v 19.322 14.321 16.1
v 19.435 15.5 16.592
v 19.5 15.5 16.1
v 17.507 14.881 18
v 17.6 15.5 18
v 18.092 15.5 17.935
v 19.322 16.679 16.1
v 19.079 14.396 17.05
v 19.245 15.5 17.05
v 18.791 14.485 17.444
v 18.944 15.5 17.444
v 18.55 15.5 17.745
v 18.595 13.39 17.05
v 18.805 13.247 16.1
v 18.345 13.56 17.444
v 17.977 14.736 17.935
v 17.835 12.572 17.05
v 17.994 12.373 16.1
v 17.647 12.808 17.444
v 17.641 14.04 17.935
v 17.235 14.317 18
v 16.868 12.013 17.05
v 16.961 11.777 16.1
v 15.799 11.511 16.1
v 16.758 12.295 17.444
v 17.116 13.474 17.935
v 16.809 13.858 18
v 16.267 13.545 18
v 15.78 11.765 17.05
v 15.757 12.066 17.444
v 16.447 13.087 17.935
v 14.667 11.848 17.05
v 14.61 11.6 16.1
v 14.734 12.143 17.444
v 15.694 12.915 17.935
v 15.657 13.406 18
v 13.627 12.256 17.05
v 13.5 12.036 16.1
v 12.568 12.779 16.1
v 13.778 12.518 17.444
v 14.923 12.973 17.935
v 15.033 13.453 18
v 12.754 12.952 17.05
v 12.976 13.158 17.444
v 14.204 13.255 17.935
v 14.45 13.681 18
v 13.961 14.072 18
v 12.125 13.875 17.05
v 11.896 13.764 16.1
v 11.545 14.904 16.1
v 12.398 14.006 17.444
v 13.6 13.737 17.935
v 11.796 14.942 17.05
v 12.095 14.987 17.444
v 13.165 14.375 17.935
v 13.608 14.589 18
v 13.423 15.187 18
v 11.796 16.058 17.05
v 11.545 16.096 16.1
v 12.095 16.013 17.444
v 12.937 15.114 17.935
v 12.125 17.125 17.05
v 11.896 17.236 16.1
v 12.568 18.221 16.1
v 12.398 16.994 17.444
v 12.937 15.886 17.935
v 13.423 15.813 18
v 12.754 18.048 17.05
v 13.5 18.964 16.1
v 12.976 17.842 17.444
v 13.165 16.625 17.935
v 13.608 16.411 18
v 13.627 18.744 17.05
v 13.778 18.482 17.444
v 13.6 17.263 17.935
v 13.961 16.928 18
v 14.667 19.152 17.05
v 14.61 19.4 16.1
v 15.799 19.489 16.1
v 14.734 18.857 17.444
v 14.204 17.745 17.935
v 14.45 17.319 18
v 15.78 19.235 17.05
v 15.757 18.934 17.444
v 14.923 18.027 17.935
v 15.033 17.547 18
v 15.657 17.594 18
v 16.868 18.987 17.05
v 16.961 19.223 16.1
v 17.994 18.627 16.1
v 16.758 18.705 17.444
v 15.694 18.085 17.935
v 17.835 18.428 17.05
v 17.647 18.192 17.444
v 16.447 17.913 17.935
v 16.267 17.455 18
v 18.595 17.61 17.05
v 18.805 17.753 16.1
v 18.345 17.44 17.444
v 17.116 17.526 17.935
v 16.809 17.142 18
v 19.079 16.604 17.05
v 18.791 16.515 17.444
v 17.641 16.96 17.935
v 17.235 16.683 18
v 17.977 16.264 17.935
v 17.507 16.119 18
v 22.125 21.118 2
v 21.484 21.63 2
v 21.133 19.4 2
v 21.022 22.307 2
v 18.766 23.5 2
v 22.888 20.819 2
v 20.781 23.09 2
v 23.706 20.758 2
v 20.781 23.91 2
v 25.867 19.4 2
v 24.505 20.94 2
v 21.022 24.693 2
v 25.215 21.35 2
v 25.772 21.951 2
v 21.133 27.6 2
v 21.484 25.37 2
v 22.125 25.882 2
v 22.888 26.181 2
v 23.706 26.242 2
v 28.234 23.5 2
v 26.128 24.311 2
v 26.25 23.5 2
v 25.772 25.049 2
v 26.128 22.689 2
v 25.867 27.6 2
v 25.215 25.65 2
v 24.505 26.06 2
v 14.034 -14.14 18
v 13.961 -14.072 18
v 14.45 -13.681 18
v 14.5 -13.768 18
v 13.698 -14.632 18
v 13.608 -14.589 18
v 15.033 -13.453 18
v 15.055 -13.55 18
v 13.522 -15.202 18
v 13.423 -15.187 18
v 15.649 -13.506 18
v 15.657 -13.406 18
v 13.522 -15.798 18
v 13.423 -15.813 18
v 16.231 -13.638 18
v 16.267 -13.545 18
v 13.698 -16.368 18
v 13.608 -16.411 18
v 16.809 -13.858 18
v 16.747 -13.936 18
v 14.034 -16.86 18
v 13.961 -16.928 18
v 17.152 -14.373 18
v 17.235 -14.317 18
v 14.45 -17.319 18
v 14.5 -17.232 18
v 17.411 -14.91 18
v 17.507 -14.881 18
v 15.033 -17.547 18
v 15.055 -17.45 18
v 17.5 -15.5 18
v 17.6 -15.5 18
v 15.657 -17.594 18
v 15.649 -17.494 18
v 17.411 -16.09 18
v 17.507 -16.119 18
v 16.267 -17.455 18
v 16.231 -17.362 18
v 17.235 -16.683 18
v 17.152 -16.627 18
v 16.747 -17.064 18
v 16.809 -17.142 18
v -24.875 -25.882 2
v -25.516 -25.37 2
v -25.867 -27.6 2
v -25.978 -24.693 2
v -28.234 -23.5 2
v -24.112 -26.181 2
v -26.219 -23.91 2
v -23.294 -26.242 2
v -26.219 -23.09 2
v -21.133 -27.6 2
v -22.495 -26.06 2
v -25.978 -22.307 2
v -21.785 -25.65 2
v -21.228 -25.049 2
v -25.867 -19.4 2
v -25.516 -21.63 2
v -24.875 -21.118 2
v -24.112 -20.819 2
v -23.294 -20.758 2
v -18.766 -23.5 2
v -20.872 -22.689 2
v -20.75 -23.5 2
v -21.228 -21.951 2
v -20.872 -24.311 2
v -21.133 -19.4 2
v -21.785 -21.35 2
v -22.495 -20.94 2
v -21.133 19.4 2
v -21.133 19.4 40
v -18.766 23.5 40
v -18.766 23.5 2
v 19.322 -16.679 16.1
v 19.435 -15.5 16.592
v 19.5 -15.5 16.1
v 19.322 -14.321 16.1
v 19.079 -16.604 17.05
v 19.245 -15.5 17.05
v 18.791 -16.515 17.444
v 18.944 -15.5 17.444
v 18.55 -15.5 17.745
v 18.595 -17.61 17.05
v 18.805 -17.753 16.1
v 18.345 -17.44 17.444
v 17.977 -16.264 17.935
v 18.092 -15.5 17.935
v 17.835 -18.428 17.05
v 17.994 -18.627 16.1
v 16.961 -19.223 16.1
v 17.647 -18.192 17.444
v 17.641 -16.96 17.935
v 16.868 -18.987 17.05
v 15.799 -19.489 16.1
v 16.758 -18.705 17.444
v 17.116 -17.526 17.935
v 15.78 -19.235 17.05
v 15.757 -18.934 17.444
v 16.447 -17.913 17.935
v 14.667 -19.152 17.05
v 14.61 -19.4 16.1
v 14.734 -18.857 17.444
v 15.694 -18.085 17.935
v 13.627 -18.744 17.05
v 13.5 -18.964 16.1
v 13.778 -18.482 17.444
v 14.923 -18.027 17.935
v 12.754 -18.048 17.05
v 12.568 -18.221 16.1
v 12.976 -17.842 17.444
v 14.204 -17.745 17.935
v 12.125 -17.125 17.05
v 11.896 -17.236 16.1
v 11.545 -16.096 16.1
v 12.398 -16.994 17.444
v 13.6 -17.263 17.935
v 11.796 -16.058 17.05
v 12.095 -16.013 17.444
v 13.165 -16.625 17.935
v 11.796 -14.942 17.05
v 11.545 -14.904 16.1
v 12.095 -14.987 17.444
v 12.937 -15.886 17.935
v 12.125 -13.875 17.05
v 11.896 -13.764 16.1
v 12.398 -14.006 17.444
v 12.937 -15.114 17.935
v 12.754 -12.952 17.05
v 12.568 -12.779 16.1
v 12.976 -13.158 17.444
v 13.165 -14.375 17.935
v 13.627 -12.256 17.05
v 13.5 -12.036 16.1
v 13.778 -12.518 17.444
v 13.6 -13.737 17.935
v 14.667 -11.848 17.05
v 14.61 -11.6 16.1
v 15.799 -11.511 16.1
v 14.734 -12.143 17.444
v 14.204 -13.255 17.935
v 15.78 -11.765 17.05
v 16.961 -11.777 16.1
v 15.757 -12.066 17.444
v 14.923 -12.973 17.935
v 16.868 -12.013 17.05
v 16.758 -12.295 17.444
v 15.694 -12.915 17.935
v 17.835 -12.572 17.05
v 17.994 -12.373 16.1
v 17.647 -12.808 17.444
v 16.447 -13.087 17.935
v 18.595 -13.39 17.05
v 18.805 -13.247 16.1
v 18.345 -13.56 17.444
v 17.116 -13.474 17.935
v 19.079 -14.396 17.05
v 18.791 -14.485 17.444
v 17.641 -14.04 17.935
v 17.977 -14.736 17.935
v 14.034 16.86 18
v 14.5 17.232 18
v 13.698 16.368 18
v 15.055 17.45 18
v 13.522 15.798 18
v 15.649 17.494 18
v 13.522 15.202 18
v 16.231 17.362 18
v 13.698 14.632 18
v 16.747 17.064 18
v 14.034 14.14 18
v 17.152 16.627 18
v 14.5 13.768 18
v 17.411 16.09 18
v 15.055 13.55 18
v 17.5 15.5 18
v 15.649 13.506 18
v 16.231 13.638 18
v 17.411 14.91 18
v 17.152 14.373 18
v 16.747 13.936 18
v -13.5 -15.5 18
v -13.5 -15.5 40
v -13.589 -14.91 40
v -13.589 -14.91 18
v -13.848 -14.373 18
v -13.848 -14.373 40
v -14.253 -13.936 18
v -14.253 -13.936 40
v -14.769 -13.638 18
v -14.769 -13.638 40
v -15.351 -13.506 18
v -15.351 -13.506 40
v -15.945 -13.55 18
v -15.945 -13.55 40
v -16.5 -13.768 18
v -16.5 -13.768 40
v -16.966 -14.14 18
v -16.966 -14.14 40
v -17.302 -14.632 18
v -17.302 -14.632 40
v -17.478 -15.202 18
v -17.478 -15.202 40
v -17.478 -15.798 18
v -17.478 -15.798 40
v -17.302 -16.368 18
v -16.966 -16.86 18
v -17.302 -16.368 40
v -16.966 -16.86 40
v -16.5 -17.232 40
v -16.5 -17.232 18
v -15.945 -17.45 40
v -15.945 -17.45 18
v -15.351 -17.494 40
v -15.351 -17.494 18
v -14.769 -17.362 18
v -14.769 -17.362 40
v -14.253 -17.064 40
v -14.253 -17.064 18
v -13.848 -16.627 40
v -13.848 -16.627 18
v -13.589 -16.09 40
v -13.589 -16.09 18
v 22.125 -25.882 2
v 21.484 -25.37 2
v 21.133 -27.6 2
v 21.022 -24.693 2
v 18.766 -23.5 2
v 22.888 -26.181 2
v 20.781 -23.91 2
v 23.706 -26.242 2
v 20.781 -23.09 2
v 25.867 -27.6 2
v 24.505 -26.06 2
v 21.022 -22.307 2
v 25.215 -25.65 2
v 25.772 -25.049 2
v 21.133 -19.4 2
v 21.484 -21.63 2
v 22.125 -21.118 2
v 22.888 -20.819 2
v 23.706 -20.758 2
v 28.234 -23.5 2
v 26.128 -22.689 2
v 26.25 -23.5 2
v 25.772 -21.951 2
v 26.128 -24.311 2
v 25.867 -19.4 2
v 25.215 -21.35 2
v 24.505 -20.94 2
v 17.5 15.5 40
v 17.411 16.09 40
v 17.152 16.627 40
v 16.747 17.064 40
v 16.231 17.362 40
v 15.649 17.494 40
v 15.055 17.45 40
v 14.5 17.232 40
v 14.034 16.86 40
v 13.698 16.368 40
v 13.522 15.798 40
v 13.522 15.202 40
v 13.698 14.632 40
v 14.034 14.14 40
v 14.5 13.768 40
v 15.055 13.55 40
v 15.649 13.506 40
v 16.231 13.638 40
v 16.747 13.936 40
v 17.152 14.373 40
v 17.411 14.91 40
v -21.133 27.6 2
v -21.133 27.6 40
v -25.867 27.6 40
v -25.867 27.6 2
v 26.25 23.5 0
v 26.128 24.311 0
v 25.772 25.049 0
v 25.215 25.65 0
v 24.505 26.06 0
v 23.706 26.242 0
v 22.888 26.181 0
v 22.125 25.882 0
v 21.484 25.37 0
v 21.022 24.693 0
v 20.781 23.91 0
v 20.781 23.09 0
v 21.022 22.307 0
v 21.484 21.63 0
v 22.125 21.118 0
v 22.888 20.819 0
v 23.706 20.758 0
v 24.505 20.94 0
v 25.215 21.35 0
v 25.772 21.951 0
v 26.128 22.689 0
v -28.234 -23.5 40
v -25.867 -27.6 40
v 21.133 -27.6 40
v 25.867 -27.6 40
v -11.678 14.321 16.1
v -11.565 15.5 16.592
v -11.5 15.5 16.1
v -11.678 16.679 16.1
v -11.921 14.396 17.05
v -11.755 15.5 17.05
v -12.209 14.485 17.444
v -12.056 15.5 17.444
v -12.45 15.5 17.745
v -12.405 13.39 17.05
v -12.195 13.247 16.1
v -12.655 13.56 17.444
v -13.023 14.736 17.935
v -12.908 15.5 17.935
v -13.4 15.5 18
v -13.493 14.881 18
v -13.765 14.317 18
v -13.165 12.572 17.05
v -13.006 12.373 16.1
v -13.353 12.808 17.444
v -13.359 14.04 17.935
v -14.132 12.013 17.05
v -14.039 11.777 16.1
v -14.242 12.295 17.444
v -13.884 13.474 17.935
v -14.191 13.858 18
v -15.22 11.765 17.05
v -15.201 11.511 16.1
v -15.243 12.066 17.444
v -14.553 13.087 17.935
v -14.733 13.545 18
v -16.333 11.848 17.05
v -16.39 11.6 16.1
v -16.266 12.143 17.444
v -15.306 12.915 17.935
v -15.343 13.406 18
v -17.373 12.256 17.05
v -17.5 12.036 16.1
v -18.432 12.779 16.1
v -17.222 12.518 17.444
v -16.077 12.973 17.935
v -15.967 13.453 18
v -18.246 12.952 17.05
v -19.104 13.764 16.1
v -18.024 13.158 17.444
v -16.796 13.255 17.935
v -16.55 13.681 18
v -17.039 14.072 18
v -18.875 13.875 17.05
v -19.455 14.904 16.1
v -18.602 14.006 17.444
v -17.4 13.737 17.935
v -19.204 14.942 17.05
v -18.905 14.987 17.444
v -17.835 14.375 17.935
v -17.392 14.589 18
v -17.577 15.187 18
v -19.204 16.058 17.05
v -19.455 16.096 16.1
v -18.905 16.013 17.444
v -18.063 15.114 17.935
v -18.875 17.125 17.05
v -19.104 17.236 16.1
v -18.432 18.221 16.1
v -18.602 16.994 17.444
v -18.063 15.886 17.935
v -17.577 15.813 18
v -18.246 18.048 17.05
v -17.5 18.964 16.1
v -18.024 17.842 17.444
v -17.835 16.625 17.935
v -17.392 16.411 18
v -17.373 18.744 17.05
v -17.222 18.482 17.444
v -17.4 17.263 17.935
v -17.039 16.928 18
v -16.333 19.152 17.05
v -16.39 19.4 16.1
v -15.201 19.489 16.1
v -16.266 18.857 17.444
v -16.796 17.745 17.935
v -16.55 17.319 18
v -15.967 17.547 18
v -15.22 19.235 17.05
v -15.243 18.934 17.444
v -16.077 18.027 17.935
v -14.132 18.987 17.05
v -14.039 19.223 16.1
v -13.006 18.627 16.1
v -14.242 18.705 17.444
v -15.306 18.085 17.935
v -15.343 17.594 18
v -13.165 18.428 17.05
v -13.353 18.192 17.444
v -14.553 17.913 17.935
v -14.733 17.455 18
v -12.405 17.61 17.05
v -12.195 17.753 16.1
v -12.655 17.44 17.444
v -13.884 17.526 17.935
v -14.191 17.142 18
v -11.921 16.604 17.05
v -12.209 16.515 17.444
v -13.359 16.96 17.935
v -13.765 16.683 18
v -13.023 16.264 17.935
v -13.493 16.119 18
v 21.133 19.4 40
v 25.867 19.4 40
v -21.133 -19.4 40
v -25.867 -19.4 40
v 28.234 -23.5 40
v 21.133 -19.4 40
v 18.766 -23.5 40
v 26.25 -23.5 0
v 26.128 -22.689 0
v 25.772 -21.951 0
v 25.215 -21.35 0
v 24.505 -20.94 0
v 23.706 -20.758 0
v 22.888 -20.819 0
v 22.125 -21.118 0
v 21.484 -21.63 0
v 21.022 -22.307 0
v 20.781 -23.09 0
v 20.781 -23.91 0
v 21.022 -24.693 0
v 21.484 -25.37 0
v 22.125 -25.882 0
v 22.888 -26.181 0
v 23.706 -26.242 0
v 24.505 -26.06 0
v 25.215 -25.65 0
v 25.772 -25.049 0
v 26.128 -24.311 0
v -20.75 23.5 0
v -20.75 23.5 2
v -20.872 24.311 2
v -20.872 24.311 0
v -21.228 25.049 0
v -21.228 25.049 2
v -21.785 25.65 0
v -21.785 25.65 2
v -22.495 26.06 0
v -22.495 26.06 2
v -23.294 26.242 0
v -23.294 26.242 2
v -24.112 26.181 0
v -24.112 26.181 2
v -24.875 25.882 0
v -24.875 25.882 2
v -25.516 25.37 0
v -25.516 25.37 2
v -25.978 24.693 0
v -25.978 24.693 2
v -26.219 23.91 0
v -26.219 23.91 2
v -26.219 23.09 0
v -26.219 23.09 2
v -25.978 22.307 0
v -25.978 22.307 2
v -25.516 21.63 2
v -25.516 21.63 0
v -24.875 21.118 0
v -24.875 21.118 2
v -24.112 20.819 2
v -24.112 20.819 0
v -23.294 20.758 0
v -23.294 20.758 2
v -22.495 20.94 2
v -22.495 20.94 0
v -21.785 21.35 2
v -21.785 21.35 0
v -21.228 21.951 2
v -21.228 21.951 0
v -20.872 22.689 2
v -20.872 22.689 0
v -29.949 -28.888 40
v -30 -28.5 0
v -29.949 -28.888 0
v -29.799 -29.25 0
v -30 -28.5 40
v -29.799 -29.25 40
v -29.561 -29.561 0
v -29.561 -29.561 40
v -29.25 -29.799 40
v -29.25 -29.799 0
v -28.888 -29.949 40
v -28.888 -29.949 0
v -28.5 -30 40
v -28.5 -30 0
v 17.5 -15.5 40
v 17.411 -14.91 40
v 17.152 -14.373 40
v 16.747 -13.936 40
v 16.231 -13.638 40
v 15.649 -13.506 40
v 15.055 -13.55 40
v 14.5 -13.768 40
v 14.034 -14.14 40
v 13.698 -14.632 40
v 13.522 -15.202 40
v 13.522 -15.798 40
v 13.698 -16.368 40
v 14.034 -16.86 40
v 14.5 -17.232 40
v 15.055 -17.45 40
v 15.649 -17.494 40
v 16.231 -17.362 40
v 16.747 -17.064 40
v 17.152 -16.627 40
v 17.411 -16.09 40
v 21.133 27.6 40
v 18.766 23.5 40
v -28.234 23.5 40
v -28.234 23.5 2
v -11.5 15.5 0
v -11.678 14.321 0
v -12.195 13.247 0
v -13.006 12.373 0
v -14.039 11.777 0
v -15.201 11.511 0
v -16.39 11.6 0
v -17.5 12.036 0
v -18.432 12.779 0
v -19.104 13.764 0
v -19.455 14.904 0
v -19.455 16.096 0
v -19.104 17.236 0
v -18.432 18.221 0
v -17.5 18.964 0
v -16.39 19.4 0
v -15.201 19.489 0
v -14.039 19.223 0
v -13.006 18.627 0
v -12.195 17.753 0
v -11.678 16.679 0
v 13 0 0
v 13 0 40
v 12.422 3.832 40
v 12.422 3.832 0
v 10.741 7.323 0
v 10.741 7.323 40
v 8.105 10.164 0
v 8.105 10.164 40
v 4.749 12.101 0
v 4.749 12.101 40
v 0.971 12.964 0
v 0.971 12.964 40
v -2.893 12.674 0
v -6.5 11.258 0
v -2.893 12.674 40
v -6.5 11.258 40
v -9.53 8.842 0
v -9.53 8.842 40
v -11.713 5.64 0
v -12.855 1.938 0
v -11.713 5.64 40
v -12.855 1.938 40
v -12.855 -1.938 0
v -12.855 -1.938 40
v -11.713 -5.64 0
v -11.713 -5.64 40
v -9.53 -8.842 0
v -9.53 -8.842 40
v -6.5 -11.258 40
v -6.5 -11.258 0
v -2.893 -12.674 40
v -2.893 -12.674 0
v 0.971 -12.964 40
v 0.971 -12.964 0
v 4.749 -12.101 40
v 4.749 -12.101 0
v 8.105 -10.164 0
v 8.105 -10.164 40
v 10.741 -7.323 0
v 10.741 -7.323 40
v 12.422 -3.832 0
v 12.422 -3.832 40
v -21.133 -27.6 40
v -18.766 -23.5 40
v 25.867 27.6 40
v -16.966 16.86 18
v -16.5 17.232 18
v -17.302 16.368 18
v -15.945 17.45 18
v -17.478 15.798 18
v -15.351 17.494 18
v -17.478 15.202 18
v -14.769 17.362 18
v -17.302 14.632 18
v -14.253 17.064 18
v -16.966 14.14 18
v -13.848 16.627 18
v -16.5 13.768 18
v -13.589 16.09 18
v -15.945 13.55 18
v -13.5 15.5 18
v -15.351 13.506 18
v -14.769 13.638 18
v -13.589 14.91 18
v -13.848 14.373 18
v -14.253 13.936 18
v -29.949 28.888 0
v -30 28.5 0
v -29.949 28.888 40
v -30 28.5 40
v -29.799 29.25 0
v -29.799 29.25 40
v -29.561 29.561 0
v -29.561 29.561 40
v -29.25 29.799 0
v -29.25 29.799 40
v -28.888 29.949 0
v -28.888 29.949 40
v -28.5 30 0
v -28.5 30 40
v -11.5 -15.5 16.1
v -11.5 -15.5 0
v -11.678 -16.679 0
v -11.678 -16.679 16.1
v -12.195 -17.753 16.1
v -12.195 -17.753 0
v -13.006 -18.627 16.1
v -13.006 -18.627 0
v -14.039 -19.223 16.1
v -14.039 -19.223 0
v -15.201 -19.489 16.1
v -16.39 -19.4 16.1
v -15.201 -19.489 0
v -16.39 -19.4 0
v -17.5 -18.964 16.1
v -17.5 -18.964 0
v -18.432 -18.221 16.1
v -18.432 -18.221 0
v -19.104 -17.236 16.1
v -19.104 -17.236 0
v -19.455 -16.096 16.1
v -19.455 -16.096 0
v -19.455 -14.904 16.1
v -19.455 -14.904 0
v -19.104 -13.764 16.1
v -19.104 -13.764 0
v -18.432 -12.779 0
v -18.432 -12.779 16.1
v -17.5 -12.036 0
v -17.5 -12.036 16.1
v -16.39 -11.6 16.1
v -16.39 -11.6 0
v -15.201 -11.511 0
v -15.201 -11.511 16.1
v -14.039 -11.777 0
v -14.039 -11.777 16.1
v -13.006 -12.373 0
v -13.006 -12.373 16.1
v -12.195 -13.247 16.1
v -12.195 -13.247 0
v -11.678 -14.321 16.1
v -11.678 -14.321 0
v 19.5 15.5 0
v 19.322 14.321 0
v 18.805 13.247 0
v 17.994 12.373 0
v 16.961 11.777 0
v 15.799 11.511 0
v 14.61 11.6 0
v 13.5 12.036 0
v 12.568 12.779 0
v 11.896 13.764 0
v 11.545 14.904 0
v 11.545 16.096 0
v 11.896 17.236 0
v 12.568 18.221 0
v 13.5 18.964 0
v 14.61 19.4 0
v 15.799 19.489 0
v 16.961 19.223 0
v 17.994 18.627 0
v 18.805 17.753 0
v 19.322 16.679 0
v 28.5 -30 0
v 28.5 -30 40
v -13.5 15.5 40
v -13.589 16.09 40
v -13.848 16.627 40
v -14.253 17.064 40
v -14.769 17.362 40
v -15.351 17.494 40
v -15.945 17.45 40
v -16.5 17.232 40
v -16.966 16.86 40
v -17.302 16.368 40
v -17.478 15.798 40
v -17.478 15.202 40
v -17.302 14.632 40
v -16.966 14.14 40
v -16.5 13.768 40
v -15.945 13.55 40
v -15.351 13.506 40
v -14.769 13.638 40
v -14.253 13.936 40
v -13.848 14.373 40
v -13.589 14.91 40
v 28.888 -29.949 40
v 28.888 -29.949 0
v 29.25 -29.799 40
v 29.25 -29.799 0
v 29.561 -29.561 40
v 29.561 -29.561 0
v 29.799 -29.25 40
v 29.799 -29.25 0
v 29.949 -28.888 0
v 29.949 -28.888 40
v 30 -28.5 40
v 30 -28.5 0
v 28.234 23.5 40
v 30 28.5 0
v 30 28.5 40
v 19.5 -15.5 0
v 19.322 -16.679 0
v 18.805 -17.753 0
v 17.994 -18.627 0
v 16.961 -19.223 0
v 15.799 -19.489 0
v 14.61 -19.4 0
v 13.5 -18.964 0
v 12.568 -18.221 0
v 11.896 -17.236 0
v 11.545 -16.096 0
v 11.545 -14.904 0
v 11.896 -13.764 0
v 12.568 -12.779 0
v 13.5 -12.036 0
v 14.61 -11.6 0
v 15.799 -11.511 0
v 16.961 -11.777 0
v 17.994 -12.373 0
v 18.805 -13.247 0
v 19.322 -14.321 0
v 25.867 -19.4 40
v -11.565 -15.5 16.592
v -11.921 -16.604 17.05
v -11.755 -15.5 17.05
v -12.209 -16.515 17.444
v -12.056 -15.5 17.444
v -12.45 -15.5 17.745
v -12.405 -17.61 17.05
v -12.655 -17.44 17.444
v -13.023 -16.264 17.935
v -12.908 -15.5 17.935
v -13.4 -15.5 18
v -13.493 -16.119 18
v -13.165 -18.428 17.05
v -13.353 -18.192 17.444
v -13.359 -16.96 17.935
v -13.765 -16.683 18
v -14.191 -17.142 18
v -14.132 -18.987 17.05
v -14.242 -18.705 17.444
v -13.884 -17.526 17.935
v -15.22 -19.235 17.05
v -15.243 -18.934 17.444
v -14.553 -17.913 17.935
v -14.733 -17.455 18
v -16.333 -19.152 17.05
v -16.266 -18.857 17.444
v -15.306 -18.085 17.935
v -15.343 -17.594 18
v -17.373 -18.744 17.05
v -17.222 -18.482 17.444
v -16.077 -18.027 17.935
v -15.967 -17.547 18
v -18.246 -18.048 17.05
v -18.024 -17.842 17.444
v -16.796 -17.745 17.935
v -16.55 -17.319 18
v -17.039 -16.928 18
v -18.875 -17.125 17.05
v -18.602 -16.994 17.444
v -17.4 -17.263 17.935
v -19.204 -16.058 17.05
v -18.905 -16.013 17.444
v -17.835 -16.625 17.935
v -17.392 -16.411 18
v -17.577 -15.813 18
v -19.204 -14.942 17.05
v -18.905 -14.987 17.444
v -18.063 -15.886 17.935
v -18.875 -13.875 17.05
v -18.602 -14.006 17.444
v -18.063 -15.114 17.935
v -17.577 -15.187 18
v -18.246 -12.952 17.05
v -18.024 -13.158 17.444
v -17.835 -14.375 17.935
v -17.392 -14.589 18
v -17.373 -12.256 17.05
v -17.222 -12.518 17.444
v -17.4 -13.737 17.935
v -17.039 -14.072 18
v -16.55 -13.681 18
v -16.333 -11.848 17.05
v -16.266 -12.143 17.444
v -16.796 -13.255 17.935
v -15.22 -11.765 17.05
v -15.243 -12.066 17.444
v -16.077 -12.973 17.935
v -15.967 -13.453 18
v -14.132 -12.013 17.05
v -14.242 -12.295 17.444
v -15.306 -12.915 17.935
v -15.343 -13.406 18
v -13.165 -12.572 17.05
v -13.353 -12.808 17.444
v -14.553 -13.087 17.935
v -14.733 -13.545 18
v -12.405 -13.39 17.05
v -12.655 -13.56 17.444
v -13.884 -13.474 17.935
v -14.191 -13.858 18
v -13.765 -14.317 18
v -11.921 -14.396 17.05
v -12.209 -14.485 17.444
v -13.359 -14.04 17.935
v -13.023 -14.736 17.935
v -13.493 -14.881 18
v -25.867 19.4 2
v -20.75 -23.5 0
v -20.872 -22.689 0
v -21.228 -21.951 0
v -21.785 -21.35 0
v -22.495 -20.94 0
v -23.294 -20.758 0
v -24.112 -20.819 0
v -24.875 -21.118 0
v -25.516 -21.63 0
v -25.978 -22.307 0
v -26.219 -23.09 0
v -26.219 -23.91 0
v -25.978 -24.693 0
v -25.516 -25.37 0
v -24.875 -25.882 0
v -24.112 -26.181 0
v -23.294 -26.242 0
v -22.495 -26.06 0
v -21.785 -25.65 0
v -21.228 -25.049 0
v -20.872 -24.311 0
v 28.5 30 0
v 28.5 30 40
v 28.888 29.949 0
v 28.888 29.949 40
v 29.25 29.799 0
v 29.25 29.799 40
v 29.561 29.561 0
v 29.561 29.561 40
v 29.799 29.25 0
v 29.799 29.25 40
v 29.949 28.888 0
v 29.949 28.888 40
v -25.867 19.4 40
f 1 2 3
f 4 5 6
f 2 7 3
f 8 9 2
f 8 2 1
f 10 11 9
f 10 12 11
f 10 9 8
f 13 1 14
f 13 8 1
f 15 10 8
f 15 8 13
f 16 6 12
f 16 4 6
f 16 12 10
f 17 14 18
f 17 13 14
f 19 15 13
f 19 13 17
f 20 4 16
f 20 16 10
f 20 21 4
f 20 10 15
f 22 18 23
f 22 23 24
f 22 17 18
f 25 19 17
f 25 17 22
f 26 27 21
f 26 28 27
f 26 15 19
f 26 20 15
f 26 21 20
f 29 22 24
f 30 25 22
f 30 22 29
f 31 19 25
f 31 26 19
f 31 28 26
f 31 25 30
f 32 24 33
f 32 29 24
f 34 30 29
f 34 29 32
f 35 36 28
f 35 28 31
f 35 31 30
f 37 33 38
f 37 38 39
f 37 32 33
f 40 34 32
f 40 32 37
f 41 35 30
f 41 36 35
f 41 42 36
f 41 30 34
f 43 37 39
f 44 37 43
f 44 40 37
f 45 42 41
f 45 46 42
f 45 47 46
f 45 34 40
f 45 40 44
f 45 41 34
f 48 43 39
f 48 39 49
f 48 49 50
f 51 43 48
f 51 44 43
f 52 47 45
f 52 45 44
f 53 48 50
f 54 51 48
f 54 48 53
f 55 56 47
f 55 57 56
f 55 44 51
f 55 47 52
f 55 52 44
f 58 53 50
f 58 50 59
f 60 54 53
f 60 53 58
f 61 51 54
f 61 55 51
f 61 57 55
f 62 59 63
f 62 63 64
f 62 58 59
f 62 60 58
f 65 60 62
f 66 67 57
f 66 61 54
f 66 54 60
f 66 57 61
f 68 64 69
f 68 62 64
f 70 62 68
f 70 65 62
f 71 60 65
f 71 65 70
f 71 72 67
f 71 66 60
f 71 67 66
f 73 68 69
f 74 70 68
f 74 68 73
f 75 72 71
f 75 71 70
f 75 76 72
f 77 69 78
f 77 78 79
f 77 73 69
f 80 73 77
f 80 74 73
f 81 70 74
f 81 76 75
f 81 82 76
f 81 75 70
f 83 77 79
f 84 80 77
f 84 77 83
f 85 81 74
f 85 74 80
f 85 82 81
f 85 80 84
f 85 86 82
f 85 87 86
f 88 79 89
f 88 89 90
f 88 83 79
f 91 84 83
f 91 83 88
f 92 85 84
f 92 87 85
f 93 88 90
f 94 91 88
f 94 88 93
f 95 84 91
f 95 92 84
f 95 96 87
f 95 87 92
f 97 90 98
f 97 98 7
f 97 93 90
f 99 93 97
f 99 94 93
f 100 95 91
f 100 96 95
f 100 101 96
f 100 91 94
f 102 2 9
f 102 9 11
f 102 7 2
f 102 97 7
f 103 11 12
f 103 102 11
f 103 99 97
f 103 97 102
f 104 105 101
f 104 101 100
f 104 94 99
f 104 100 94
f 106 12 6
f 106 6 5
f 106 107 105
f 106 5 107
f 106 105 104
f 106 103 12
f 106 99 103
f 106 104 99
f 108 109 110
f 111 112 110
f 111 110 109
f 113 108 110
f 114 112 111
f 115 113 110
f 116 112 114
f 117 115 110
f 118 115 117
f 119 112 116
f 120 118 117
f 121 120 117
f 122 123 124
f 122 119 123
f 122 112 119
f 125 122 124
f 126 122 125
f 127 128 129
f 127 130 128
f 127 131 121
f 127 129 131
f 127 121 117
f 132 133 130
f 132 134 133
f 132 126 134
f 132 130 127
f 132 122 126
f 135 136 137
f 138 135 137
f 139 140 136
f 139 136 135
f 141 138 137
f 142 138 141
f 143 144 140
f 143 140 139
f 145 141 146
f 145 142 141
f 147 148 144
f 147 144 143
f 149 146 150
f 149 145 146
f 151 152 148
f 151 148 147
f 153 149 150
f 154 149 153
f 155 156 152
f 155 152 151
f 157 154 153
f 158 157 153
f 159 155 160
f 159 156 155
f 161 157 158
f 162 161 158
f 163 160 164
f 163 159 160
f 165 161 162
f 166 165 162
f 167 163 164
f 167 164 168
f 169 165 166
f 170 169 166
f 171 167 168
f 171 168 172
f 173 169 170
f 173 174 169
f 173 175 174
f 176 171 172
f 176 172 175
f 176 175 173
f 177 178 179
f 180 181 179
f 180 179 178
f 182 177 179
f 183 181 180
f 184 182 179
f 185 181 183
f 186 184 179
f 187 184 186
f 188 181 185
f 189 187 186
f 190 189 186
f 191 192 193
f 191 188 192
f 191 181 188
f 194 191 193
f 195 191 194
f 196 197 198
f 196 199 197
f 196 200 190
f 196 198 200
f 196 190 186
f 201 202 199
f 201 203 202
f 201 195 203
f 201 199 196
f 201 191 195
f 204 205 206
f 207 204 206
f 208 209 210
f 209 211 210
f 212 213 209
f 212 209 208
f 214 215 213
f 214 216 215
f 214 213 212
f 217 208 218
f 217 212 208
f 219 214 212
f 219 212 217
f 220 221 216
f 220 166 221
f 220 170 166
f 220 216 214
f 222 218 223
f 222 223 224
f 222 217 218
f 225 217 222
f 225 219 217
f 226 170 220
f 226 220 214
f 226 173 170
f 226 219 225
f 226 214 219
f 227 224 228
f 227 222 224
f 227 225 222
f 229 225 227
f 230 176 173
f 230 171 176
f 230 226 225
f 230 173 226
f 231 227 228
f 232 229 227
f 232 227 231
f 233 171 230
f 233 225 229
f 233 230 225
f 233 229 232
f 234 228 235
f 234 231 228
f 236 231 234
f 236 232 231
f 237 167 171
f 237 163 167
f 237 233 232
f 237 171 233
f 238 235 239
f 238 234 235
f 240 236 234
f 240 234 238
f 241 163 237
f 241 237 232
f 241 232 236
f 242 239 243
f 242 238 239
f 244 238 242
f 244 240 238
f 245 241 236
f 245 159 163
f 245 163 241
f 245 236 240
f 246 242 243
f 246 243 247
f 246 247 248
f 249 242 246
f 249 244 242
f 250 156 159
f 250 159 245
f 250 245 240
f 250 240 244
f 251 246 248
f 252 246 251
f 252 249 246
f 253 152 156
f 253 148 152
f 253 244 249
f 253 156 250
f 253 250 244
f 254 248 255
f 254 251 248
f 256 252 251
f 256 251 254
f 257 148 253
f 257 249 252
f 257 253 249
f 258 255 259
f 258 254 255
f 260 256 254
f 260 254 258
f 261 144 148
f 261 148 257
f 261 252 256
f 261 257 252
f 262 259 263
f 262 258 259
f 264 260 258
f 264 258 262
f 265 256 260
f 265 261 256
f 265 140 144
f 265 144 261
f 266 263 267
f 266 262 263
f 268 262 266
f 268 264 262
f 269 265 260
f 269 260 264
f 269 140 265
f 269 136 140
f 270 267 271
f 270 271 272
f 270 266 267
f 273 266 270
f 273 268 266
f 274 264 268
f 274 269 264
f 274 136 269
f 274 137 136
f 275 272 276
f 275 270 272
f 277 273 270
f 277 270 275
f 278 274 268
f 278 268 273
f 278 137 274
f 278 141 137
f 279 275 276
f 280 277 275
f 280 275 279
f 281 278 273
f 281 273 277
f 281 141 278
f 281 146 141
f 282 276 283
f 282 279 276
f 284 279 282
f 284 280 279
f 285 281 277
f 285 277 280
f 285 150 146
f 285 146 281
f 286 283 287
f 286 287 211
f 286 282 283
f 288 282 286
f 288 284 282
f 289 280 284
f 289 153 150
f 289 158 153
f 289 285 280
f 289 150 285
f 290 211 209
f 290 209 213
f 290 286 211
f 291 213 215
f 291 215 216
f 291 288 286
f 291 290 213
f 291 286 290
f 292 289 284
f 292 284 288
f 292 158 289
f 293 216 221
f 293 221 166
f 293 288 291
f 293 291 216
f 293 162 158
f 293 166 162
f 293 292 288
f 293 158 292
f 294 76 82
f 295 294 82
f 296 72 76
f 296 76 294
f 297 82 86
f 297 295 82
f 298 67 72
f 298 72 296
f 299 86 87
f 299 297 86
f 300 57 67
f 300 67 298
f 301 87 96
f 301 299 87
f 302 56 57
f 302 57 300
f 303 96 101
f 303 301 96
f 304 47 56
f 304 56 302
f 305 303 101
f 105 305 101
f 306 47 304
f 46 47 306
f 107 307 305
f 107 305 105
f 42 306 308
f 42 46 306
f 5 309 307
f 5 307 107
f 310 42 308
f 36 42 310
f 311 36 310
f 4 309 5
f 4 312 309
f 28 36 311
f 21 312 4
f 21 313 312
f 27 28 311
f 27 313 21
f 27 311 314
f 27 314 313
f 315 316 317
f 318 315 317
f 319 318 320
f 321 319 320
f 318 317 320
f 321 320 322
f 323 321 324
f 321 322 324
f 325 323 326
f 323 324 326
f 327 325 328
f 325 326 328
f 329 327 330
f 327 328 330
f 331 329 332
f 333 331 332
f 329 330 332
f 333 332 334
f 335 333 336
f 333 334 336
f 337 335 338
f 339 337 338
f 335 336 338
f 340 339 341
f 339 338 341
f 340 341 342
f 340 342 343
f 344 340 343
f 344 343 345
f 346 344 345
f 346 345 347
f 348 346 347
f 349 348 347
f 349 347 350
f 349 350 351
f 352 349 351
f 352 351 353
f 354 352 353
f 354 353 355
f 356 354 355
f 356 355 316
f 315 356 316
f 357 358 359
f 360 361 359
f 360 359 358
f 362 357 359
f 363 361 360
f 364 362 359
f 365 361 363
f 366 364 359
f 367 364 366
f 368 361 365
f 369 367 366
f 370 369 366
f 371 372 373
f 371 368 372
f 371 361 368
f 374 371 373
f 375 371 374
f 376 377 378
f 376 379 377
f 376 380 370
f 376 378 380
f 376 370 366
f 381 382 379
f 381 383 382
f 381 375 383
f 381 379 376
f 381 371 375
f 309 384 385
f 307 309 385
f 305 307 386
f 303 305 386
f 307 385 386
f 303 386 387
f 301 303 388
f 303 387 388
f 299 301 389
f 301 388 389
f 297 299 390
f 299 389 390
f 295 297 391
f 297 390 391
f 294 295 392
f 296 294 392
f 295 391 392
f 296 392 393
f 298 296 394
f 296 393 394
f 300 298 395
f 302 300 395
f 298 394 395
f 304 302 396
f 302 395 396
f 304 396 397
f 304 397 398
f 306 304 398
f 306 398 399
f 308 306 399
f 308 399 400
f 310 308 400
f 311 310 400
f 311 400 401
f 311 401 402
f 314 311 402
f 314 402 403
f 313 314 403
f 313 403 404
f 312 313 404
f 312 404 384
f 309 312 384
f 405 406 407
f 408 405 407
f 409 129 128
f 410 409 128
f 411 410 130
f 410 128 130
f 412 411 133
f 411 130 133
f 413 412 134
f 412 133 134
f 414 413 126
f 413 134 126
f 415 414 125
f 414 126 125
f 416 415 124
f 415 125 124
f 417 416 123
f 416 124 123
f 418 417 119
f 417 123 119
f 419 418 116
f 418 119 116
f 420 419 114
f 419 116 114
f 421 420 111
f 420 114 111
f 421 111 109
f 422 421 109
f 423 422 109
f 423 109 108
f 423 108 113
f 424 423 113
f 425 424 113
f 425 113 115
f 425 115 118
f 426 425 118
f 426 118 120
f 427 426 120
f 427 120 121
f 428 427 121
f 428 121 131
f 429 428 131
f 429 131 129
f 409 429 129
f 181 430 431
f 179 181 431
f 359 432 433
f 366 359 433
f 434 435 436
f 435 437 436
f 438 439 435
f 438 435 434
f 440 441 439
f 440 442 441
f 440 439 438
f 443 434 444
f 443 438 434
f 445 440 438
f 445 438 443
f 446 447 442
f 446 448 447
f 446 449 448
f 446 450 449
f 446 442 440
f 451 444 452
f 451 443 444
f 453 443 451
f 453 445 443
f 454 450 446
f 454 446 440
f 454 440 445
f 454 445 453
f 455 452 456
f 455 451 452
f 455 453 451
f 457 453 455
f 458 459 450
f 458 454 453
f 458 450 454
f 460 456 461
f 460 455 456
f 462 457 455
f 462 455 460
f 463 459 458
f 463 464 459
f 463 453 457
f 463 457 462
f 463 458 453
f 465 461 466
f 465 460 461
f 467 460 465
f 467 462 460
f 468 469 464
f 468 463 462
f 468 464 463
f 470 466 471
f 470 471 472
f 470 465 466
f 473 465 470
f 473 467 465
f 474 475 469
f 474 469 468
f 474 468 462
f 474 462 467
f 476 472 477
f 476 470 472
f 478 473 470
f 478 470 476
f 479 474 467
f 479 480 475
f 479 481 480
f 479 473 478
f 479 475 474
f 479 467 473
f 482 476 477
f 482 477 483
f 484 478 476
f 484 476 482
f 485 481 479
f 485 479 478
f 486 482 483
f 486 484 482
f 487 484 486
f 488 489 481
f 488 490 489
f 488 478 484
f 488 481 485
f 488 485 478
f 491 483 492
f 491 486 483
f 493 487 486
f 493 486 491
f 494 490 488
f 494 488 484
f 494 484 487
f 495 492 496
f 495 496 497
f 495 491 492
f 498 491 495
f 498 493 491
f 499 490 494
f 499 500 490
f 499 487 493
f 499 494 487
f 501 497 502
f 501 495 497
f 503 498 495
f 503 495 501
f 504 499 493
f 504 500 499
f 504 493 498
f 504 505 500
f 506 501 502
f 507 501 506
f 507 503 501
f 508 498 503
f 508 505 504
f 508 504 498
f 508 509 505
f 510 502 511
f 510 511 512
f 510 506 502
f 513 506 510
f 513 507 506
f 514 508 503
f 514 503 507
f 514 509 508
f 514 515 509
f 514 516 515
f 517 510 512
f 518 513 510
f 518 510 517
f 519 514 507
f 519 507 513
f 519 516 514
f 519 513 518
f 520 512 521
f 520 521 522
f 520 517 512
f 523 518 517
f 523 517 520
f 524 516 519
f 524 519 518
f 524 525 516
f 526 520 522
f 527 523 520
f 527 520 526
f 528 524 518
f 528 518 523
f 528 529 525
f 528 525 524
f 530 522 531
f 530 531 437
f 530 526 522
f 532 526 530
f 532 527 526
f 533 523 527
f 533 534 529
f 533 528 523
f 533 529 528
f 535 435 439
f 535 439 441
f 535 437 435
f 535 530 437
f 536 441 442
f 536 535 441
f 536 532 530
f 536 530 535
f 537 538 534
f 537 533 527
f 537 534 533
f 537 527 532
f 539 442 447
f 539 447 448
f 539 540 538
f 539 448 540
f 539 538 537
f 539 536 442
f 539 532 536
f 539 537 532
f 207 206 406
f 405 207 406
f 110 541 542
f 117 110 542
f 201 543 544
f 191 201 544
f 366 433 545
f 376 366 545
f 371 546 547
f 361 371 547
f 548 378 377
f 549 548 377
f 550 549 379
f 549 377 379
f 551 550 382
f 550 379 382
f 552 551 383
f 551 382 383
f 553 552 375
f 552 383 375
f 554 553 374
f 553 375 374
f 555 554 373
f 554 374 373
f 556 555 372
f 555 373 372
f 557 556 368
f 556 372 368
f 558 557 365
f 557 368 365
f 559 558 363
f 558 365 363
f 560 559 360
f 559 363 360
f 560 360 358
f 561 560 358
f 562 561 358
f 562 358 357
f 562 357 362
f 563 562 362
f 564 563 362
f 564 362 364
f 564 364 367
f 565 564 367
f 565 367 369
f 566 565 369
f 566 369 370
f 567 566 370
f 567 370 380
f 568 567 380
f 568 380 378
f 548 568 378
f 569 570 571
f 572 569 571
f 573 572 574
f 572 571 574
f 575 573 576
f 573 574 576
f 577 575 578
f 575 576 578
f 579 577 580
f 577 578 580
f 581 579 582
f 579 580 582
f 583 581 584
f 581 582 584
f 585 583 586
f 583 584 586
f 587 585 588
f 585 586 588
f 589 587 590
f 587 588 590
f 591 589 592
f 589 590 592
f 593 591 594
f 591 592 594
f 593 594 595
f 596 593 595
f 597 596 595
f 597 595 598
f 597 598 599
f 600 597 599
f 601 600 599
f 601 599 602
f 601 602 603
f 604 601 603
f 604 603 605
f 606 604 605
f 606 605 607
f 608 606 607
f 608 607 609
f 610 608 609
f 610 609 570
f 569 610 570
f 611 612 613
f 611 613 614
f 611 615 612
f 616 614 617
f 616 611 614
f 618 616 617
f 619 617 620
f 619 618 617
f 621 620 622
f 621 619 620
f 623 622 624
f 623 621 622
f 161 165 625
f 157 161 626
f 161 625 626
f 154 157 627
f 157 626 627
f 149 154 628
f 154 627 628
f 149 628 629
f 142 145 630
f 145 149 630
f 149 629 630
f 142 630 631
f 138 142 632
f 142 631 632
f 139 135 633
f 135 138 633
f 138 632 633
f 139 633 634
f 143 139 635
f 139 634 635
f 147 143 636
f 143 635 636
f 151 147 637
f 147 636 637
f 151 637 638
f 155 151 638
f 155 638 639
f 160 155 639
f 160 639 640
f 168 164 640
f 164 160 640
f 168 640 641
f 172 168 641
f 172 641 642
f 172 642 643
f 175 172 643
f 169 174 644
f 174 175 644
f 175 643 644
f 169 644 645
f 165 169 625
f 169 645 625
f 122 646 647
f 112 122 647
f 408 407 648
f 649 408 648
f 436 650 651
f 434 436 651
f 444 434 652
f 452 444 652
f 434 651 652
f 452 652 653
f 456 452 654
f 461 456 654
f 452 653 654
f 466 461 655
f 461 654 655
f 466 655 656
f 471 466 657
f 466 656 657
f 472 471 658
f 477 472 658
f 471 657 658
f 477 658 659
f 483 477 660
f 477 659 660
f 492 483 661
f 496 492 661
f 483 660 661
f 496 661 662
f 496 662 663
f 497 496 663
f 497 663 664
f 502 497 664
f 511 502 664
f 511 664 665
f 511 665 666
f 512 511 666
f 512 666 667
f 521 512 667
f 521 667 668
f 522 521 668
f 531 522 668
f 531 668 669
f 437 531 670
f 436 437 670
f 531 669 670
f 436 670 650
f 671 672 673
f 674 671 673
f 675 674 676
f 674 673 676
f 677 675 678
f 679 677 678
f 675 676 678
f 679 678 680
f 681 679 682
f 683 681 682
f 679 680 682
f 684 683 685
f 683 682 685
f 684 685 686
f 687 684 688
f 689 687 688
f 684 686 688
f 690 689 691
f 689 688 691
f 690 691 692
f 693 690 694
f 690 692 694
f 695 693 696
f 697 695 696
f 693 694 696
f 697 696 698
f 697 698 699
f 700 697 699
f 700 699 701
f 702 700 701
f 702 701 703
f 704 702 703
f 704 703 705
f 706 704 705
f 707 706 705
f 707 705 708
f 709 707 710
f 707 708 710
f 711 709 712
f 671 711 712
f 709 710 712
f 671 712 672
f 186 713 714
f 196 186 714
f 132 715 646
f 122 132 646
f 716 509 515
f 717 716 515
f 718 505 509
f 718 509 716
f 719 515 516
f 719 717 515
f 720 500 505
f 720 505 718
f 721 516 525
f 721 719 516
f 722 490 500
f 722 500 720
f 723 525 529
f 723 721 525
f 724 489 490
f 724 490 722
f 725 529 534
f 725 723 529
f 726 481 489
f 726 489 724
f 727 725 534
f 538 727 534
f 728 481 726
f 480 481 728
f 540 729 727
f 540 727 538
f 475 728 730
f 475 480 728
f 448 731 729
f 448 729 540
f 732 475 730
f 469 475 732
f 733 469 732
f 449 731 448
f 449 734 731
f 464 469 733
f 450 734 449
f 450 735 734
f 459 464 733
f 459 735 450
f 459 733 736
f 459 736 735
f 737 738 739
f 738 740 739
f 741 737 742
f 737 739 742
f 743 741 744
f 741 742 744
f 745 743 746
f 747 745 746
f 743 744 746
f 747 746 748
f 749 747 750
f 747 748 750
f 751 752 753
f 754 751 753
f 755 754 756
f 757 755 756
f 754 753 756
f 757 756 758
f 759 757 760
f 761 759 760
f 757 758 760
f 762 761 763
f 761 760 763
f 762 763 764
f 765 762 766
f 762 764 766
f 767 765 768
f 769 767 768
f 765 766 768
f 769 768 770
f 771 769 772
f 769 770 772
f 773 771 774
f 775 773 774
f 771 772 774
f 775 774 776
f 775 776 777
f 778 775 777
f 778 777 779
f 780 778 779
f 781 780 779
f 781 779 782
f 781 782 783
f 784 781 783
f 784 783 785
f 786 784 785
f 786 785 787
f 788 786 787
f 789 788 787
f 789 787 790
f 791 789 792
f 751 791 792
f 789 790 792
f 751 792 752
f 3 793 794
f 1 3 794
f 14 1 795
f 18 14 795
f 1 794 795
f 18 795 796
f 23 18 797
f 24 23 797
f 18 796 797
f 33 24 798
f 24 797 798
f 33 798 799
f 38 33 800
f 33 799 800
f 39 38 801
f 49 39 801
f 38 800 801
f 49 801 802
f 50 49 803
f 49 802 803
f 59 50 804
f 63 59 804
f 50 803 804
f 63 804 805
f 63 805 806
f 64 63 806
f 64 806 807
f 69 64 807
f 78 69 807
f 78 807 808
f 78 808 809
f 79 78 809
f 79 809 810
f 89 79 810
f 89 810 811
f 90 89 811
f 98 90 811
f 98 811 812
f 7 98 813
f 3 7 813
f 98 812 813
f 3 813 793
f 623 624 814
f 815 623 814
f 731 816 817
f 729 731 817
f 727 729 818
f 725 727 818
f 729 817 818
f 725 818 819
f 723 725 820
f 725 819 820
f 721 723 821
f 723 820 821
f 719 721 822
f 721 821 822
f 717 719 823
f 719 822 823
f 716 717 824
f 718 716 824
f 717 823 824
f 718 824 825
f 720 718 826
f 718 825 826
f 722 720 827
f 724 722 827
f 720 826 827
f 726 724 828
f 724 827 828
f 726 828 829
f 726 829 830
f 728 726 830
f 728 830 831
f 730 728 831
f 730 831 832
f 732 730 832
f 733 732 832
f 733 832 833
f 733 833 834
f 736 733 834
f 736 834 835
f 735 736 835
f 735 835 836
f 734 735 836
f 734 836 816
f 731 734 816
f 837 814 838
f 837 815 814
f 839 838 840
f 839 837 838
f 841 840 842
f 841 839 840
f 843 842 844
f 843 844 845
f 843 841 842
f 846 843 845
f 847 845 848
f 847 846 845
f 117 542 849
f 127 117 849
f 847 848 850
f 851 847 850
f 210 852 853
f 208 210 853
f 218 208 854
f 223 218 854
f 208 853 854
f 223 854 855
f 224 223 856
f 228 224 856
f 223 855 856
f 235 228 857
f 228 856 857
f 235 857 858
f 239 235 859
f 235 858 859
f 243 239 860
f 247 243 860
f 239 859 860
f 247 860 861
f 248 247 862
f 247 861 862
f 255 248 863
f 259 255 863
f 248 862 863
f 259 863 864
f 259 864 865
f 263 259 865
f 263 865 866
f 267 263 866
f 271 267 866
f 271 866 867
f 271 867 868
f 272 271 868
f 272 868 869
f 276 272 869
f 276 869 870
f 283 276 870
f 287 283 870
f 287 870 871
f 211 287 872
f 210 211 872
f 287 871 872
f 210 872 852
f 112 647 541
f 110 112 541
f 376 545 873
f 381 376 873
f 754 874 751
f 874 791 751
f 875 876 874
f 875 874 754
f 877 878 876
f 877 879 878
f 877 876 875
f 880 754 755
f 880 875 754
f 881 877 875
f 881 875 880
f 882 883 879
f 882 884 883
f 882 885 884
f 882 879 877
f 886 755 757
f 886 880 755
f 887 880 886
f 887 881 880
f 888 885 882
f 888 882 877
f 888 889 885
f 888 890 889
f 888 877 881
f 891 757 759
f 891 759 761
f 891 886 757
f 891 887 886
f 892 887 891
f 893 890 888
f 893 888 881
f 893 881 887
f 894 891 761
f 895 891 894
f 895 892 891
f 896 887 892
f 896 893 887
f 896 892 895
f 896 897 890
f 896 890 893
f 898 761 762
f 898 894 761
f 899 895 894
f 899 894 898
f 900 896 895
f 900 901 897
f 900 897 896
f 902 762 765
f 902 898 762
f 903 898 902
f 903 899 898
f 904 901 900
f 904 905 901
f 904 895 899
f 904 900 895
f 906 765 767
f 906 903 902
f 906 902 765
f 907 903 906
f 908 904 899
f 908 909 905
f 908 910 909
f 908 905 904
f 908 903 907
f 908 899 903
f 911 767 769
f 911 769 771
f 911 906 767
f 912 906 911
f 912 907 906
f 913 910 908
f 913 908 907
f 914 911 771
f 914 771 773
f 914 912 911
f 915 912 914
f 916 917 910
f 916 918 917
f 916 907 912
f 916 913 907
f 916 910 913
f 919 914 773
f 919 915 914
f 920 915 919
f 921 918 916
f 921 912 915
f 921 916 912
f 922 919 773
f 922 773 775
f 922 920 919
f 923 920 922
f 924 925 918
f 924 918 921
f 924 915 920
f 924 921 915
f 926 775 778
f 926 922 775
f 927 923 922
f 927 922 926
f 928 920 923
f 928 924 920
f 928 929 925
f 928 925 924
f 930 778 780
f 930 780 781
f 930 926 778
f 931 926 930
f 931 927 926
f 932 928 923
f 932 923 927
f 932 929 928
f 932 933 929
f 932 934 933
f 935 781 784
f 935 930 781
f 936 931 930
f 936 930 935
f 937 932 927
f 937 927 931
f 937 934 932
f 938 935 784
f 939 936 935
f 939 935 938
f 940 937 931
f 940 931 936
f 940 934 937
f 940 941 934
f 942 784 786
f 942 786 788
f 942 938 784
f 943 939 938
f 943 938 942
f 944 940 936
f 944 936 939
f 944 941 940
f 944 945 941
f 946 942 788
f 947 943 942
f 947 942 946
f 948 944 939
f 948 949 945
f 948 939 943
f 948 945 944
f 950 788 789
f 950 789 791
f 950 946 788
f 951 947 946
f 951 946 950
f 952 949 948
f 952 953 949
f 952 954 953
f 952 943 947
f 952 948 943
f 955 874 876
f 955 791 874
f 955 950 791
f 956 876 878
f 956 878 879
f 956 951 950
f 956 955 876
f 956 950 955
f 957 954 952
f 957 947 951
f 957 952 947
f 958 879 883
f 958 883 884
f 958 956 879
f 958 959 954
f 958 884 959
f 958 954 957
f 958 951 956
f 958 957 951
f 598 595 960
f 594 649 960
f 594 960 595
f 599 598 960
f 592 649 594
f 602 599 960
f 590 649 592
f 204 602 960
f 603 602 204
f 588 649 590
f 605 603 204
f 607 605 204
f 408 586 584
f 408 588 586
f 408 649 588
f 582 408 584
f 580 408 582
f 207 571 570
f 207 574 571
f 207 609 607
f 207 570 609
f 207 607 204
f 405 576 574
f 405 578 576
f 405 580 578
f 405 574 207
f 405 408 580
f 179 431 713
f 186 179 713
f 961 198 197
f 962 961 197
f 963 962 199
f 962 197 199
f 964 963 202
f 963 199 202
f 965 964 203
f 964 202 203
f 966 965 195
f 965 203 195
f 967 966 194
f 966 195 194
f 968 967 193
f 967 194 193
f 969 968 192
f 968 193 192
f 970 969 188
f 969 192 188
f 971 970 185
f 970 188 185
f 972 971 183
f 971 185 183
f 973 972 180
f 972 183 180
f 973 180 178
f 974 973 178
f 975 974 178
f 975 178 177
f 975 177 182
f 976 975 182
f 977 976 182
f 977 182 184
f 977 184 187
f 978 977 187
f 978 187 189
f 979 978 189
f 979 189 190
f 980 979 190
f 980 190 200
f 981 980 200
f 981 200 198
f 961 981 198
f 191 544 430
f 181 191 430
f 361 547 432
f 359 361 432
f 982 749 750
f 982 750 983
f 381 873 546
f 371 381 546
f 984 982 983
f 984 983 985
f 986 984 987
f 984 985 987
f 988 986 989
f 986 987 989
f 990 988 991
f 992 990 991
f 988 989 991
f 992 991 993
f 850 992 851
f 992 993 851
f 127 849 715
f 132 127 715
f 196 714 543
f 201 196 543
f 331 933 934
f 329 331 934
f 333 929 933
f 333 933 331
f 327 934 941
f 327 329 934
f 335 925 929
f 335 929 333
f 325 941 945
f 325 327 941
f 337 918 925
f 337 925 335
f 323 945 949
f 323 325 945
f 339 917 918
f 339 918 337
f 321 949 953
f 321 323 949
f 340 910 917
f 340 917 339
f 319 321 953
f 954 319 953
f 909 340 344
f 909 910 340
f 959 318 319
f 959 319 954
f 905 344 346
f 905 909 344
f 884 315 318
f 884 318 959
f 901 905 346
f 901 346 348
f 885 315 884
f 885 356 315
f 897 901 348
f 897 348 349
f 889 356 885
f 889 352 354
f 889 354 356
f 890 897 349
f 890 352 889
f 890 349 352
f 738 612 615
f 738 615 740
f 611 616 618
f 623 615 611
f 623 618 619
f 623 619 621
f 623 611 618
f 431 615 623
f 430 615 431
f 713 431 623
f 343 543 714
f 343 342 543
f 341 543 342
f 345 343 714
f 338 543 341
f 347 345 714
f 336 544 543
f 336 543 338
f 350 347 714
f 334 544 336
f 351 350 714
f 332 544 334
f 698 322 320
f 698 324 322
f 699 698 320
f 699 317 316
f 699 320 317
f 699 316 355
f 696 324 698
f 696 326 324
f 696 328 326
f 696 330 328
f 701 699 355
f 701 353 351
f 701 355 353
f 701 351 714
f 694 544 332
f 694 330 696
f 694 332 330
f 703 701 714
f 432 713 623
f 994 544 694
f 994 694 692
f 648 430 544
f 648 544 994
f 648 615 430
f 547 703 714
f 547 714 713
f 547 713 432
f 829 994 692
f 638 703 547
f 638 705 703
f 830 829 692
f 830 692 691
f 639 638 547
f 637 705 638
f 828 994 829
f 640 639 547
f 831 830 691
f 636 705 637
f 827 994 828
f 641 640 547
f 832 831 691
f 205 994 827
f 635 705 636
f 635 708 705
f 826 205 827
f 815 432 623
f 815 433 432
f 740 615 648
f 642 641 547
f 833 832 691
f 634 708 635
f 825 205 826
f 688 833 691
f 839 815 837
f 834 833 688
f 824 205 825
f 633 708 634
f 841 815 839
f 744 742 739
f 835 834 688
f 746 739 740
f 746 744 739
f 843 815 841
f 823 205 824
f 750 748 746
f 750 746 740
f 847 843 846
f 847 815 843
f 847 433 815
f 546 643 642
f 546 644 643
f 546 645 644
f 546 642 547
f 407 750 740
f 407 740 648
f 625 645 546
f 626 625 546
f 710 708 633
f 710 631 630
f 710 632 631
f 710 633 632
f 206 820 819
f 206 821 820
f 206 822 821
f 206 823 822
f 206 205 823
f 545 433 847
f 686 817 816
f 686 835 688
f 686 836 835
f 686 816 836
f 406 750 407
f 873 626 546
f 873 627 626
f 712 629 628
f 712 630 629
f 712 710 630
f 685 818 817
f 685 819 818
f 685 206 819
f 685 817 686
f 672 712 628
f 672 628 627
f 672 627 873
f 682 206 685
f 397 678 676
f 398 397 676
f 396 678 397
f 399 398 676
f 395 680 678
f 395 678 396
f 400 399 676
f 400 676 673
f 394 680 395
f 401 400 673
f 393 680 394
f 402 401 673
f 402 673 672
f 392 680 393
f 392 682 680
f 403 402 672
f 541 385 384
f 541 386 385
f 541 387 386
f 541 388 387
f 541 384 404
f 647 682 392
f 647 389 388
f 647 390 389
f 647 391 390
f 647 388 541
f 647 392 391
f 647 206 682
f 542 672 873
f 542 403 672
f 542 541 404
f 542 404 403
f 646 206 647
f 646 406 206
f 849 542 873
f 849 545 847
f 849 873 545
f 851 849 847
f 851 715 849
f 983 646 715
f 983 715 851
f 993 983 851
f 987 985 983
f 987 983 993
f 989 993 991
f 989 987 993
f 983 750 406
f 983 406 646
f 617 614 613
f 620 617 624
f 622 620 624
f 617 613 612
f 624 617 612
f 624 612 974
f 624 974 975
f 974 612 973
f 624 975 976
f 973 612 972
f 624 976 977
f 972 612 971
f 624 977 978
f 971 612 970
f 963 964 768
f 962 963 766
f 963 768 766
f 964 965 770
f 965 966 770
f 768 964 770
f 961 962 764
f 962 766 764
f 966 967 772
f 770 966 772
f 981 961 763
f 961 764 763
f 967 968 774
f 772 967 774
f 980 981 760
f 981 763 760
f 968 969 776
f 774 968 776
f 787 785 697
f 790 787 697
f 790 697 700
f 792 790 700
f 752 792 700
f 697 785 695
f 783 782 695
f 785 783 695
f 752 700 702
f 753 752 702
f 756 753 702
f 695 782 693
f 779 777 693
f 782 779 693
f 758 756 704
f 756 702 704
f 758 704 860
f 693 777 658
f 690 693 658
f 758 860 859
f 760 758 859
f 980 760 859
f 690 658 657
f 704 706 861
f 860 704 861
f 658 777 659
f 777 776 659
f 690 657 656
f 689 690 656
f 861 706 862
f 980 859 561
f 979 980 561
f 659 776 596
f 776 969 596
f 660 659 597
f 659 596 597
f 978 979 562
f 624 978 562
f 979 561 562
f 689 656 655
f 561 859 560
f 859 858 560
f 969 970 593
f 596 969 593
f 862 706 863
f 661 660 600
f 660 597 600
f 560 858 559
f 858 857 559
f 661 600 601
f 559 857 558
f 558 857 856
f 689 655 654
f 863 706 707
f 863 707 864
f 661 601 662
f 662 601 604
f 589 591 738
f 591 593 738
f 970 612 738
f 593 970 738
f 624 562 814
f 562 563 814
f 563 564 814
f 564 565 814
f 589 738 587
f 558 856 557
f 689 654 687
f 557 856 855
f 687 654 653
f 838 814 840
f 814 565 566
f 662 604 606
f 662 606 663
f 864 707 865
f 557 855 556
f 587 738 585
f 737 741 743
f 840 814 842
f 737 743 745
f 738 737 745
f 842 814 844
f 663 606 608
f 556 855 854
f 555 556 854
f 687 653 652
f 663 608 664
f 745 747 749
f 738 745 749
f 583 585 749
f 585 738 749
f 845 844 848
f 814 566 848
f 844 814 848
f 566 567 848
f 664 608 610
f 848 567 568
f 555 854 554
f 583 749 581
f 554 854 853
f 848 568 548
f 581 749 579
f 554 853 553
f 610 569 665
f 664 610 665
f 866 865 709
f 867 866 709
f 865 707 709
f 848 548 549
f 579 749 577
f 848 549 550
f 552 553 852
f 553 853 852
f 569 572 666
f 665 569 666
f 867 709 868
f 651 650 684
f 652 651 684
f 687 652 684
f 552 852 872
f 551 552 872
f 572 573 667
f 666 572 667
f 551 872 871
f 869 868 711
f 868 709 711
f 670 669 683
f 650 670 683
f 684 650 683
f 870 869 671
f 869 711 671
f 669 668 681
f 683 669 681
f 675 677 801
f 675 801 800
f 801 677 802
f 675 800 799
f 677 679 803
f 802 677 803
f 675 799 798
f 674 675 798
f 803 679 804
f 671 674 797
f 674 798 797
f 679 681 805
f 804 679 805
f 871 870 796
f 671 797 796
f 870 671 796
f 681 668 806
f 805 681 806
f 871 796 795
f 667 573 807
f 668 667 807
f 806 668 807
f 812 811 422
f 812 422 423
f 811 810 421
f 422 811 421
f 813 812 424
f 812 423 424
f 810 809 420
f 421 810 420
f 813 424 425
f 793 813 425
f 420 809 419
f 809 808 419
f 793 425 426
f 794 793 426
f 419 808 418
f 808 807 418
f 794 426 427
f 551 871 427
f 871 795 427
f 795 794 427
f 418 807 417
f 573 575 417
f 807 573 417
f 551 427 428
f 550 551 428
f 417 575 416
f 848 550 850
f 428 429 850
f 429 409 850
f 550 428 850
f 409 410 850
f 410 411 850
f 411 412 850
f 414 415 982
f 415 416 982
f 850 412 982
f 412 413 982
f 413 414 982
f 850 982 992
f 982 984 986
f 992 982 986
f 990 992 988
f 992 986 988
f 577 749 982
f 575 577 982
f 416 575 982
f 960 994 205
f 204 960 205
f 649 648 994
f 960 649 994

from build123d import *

# Parameters (mm, degrees)
F0_W      = 60
F0_H      = 60
F1_DEPTH  = 40
F2_R      = 2.75
F3_DEPTH  = 40
F4_R      = 2
F5_DEPTH  = 40
F6_R      = 13
F7_DEPTH  = 40
F8_R      = 1.5
F9_R      = 2.75
F10_DEPTH = 38
F11_R     = 4
F11_R_2   = 2
F12_DEPTH = 18
F13_R     = 1.9


with BuildPart() as f1:
    # F0 (on Top) → F1 (new body)
    with BuildSketch(Plane.XY):
        Rectangle(F0_W, F0_H)
    extrude(amount=F1_DEPTH)

    # F2 (on face) → F3 (cut, through all)
    with BuildSketch(Plane.XY.offset(40)):
        with Locations((-23.5, 23.5)):
            Circle(F2_R)
        with Locations((23.5, 23.5)):
            Circle(F2_R)
        with Locations((23.5, -23.5)):
            Circle(F2_R)
        with Locations((-23.5, -23.5)):
            Circle(F2_R)
    extrude(amount=-F3_DEPTH, mode=Mode.SUBTRACT)

    # F4 (on face) → F5 (cut, through all)
    with BuildSketch(Plane.XY.offset(40)):
        with Locations((-15.5, 15.5)):
            Circle(F4_R)
        with Locations((15.5, 15.5)):
            Circle(F4_R)
        with Locations((15.5, -15.5)):
            Circle(F4_R)
        with Locations((-15.5, -15.5)):
            Circle(F4_R)
    extrude(amount=-F5_DEPTH, mode=Mode.SUBTRACT)

    # F6 (on face) → F7 (cut, through all)
    with BuildSketch(Plane.XY.offset(40)):
        Circle(F6_R)
    extrude(amount=-F7_DEPTH, mode=Mode.SUBTRACT)

    # F8
    f8_edges = [f1.edges().sort_by_distance(p)[0] for p in [
        (30, -30, 20),
        (-30, -30, 20),
        (-30, 30, 20),
        (30, 30, 20),
    ]]
    fillet(f8_edges, radius=F8_R)

    # F9 (on face) → F10 (cut)
    with BuildSketch(Plane.XY.offset(40)):
        Polygon((21.132864, 19.4), (25.867136, 19.4), (28.234272, 23.5), (25.867136, 27.6), (21.132864, 27.6), (18.765728, 23.5), align=None)
        with Locations((23.5, 23.5)):
            Circle(F9_R, mode=Mode.SUBTRACT)
        Polygon((-25.867136, 19.4), (-21.132864, 19.4), (-18.765728, 23.5), (-21.132864, 27.6), (-25.867136, 27.6), (-28.234272, 23.5), align=None)
        Polygon((25.867136, -19.4), (21.132864, -19.4), (18.765728, -23.5), (21.132864, -27.6), (25.867136, -27.6), (28.234272, -23.5), align=None)
        Polygon((-21.132864, -19.4), (-25.867136, -19.4), (-28.234272, -23.5), (-25.867136, -27.6), (-21.132864, -27.6), (-18.765728, -23.5), align=None)
    extrude(amount=-F10_DEPTH, mode=Mode.SUBTRACT)

    # F11 (on face) → F12 (cut)
    with BuildSketch(Plane(origin=(0, 0, 0), x_dir=(1, 0, 0), z_dir=(0, 0, -1))):
        with Locations((15.5, 15.5)):
            Circle(F11_R)
        with Locations((15.5, 15.5)):
            Circle(F11_R_2, mode=Mode.SUBTRACT)
        with Locations((-15.5, 15.5)):
            Circle(F11_R)
        with Locations((-15.5, -15.5)):
            Circle(F11_R)
        with Locations((15.5, -15.5)):
            Circle(F11_R)
    extrude(amount=-F12_DEPTH, mode=Mode.SUBTRACT)

    # F13
    f13_edges = [f1.edges().sort_by_distance(p)[0] for p in [
        (11.5, 15.5, 18),
        (-19.5, 15.5, 18),
        (11.5, -15.5, 18),
        (-19.5, -15.5, 18),
    ]]
    fillet(f13_edges, radius=F13_R)


solid = f1.part
